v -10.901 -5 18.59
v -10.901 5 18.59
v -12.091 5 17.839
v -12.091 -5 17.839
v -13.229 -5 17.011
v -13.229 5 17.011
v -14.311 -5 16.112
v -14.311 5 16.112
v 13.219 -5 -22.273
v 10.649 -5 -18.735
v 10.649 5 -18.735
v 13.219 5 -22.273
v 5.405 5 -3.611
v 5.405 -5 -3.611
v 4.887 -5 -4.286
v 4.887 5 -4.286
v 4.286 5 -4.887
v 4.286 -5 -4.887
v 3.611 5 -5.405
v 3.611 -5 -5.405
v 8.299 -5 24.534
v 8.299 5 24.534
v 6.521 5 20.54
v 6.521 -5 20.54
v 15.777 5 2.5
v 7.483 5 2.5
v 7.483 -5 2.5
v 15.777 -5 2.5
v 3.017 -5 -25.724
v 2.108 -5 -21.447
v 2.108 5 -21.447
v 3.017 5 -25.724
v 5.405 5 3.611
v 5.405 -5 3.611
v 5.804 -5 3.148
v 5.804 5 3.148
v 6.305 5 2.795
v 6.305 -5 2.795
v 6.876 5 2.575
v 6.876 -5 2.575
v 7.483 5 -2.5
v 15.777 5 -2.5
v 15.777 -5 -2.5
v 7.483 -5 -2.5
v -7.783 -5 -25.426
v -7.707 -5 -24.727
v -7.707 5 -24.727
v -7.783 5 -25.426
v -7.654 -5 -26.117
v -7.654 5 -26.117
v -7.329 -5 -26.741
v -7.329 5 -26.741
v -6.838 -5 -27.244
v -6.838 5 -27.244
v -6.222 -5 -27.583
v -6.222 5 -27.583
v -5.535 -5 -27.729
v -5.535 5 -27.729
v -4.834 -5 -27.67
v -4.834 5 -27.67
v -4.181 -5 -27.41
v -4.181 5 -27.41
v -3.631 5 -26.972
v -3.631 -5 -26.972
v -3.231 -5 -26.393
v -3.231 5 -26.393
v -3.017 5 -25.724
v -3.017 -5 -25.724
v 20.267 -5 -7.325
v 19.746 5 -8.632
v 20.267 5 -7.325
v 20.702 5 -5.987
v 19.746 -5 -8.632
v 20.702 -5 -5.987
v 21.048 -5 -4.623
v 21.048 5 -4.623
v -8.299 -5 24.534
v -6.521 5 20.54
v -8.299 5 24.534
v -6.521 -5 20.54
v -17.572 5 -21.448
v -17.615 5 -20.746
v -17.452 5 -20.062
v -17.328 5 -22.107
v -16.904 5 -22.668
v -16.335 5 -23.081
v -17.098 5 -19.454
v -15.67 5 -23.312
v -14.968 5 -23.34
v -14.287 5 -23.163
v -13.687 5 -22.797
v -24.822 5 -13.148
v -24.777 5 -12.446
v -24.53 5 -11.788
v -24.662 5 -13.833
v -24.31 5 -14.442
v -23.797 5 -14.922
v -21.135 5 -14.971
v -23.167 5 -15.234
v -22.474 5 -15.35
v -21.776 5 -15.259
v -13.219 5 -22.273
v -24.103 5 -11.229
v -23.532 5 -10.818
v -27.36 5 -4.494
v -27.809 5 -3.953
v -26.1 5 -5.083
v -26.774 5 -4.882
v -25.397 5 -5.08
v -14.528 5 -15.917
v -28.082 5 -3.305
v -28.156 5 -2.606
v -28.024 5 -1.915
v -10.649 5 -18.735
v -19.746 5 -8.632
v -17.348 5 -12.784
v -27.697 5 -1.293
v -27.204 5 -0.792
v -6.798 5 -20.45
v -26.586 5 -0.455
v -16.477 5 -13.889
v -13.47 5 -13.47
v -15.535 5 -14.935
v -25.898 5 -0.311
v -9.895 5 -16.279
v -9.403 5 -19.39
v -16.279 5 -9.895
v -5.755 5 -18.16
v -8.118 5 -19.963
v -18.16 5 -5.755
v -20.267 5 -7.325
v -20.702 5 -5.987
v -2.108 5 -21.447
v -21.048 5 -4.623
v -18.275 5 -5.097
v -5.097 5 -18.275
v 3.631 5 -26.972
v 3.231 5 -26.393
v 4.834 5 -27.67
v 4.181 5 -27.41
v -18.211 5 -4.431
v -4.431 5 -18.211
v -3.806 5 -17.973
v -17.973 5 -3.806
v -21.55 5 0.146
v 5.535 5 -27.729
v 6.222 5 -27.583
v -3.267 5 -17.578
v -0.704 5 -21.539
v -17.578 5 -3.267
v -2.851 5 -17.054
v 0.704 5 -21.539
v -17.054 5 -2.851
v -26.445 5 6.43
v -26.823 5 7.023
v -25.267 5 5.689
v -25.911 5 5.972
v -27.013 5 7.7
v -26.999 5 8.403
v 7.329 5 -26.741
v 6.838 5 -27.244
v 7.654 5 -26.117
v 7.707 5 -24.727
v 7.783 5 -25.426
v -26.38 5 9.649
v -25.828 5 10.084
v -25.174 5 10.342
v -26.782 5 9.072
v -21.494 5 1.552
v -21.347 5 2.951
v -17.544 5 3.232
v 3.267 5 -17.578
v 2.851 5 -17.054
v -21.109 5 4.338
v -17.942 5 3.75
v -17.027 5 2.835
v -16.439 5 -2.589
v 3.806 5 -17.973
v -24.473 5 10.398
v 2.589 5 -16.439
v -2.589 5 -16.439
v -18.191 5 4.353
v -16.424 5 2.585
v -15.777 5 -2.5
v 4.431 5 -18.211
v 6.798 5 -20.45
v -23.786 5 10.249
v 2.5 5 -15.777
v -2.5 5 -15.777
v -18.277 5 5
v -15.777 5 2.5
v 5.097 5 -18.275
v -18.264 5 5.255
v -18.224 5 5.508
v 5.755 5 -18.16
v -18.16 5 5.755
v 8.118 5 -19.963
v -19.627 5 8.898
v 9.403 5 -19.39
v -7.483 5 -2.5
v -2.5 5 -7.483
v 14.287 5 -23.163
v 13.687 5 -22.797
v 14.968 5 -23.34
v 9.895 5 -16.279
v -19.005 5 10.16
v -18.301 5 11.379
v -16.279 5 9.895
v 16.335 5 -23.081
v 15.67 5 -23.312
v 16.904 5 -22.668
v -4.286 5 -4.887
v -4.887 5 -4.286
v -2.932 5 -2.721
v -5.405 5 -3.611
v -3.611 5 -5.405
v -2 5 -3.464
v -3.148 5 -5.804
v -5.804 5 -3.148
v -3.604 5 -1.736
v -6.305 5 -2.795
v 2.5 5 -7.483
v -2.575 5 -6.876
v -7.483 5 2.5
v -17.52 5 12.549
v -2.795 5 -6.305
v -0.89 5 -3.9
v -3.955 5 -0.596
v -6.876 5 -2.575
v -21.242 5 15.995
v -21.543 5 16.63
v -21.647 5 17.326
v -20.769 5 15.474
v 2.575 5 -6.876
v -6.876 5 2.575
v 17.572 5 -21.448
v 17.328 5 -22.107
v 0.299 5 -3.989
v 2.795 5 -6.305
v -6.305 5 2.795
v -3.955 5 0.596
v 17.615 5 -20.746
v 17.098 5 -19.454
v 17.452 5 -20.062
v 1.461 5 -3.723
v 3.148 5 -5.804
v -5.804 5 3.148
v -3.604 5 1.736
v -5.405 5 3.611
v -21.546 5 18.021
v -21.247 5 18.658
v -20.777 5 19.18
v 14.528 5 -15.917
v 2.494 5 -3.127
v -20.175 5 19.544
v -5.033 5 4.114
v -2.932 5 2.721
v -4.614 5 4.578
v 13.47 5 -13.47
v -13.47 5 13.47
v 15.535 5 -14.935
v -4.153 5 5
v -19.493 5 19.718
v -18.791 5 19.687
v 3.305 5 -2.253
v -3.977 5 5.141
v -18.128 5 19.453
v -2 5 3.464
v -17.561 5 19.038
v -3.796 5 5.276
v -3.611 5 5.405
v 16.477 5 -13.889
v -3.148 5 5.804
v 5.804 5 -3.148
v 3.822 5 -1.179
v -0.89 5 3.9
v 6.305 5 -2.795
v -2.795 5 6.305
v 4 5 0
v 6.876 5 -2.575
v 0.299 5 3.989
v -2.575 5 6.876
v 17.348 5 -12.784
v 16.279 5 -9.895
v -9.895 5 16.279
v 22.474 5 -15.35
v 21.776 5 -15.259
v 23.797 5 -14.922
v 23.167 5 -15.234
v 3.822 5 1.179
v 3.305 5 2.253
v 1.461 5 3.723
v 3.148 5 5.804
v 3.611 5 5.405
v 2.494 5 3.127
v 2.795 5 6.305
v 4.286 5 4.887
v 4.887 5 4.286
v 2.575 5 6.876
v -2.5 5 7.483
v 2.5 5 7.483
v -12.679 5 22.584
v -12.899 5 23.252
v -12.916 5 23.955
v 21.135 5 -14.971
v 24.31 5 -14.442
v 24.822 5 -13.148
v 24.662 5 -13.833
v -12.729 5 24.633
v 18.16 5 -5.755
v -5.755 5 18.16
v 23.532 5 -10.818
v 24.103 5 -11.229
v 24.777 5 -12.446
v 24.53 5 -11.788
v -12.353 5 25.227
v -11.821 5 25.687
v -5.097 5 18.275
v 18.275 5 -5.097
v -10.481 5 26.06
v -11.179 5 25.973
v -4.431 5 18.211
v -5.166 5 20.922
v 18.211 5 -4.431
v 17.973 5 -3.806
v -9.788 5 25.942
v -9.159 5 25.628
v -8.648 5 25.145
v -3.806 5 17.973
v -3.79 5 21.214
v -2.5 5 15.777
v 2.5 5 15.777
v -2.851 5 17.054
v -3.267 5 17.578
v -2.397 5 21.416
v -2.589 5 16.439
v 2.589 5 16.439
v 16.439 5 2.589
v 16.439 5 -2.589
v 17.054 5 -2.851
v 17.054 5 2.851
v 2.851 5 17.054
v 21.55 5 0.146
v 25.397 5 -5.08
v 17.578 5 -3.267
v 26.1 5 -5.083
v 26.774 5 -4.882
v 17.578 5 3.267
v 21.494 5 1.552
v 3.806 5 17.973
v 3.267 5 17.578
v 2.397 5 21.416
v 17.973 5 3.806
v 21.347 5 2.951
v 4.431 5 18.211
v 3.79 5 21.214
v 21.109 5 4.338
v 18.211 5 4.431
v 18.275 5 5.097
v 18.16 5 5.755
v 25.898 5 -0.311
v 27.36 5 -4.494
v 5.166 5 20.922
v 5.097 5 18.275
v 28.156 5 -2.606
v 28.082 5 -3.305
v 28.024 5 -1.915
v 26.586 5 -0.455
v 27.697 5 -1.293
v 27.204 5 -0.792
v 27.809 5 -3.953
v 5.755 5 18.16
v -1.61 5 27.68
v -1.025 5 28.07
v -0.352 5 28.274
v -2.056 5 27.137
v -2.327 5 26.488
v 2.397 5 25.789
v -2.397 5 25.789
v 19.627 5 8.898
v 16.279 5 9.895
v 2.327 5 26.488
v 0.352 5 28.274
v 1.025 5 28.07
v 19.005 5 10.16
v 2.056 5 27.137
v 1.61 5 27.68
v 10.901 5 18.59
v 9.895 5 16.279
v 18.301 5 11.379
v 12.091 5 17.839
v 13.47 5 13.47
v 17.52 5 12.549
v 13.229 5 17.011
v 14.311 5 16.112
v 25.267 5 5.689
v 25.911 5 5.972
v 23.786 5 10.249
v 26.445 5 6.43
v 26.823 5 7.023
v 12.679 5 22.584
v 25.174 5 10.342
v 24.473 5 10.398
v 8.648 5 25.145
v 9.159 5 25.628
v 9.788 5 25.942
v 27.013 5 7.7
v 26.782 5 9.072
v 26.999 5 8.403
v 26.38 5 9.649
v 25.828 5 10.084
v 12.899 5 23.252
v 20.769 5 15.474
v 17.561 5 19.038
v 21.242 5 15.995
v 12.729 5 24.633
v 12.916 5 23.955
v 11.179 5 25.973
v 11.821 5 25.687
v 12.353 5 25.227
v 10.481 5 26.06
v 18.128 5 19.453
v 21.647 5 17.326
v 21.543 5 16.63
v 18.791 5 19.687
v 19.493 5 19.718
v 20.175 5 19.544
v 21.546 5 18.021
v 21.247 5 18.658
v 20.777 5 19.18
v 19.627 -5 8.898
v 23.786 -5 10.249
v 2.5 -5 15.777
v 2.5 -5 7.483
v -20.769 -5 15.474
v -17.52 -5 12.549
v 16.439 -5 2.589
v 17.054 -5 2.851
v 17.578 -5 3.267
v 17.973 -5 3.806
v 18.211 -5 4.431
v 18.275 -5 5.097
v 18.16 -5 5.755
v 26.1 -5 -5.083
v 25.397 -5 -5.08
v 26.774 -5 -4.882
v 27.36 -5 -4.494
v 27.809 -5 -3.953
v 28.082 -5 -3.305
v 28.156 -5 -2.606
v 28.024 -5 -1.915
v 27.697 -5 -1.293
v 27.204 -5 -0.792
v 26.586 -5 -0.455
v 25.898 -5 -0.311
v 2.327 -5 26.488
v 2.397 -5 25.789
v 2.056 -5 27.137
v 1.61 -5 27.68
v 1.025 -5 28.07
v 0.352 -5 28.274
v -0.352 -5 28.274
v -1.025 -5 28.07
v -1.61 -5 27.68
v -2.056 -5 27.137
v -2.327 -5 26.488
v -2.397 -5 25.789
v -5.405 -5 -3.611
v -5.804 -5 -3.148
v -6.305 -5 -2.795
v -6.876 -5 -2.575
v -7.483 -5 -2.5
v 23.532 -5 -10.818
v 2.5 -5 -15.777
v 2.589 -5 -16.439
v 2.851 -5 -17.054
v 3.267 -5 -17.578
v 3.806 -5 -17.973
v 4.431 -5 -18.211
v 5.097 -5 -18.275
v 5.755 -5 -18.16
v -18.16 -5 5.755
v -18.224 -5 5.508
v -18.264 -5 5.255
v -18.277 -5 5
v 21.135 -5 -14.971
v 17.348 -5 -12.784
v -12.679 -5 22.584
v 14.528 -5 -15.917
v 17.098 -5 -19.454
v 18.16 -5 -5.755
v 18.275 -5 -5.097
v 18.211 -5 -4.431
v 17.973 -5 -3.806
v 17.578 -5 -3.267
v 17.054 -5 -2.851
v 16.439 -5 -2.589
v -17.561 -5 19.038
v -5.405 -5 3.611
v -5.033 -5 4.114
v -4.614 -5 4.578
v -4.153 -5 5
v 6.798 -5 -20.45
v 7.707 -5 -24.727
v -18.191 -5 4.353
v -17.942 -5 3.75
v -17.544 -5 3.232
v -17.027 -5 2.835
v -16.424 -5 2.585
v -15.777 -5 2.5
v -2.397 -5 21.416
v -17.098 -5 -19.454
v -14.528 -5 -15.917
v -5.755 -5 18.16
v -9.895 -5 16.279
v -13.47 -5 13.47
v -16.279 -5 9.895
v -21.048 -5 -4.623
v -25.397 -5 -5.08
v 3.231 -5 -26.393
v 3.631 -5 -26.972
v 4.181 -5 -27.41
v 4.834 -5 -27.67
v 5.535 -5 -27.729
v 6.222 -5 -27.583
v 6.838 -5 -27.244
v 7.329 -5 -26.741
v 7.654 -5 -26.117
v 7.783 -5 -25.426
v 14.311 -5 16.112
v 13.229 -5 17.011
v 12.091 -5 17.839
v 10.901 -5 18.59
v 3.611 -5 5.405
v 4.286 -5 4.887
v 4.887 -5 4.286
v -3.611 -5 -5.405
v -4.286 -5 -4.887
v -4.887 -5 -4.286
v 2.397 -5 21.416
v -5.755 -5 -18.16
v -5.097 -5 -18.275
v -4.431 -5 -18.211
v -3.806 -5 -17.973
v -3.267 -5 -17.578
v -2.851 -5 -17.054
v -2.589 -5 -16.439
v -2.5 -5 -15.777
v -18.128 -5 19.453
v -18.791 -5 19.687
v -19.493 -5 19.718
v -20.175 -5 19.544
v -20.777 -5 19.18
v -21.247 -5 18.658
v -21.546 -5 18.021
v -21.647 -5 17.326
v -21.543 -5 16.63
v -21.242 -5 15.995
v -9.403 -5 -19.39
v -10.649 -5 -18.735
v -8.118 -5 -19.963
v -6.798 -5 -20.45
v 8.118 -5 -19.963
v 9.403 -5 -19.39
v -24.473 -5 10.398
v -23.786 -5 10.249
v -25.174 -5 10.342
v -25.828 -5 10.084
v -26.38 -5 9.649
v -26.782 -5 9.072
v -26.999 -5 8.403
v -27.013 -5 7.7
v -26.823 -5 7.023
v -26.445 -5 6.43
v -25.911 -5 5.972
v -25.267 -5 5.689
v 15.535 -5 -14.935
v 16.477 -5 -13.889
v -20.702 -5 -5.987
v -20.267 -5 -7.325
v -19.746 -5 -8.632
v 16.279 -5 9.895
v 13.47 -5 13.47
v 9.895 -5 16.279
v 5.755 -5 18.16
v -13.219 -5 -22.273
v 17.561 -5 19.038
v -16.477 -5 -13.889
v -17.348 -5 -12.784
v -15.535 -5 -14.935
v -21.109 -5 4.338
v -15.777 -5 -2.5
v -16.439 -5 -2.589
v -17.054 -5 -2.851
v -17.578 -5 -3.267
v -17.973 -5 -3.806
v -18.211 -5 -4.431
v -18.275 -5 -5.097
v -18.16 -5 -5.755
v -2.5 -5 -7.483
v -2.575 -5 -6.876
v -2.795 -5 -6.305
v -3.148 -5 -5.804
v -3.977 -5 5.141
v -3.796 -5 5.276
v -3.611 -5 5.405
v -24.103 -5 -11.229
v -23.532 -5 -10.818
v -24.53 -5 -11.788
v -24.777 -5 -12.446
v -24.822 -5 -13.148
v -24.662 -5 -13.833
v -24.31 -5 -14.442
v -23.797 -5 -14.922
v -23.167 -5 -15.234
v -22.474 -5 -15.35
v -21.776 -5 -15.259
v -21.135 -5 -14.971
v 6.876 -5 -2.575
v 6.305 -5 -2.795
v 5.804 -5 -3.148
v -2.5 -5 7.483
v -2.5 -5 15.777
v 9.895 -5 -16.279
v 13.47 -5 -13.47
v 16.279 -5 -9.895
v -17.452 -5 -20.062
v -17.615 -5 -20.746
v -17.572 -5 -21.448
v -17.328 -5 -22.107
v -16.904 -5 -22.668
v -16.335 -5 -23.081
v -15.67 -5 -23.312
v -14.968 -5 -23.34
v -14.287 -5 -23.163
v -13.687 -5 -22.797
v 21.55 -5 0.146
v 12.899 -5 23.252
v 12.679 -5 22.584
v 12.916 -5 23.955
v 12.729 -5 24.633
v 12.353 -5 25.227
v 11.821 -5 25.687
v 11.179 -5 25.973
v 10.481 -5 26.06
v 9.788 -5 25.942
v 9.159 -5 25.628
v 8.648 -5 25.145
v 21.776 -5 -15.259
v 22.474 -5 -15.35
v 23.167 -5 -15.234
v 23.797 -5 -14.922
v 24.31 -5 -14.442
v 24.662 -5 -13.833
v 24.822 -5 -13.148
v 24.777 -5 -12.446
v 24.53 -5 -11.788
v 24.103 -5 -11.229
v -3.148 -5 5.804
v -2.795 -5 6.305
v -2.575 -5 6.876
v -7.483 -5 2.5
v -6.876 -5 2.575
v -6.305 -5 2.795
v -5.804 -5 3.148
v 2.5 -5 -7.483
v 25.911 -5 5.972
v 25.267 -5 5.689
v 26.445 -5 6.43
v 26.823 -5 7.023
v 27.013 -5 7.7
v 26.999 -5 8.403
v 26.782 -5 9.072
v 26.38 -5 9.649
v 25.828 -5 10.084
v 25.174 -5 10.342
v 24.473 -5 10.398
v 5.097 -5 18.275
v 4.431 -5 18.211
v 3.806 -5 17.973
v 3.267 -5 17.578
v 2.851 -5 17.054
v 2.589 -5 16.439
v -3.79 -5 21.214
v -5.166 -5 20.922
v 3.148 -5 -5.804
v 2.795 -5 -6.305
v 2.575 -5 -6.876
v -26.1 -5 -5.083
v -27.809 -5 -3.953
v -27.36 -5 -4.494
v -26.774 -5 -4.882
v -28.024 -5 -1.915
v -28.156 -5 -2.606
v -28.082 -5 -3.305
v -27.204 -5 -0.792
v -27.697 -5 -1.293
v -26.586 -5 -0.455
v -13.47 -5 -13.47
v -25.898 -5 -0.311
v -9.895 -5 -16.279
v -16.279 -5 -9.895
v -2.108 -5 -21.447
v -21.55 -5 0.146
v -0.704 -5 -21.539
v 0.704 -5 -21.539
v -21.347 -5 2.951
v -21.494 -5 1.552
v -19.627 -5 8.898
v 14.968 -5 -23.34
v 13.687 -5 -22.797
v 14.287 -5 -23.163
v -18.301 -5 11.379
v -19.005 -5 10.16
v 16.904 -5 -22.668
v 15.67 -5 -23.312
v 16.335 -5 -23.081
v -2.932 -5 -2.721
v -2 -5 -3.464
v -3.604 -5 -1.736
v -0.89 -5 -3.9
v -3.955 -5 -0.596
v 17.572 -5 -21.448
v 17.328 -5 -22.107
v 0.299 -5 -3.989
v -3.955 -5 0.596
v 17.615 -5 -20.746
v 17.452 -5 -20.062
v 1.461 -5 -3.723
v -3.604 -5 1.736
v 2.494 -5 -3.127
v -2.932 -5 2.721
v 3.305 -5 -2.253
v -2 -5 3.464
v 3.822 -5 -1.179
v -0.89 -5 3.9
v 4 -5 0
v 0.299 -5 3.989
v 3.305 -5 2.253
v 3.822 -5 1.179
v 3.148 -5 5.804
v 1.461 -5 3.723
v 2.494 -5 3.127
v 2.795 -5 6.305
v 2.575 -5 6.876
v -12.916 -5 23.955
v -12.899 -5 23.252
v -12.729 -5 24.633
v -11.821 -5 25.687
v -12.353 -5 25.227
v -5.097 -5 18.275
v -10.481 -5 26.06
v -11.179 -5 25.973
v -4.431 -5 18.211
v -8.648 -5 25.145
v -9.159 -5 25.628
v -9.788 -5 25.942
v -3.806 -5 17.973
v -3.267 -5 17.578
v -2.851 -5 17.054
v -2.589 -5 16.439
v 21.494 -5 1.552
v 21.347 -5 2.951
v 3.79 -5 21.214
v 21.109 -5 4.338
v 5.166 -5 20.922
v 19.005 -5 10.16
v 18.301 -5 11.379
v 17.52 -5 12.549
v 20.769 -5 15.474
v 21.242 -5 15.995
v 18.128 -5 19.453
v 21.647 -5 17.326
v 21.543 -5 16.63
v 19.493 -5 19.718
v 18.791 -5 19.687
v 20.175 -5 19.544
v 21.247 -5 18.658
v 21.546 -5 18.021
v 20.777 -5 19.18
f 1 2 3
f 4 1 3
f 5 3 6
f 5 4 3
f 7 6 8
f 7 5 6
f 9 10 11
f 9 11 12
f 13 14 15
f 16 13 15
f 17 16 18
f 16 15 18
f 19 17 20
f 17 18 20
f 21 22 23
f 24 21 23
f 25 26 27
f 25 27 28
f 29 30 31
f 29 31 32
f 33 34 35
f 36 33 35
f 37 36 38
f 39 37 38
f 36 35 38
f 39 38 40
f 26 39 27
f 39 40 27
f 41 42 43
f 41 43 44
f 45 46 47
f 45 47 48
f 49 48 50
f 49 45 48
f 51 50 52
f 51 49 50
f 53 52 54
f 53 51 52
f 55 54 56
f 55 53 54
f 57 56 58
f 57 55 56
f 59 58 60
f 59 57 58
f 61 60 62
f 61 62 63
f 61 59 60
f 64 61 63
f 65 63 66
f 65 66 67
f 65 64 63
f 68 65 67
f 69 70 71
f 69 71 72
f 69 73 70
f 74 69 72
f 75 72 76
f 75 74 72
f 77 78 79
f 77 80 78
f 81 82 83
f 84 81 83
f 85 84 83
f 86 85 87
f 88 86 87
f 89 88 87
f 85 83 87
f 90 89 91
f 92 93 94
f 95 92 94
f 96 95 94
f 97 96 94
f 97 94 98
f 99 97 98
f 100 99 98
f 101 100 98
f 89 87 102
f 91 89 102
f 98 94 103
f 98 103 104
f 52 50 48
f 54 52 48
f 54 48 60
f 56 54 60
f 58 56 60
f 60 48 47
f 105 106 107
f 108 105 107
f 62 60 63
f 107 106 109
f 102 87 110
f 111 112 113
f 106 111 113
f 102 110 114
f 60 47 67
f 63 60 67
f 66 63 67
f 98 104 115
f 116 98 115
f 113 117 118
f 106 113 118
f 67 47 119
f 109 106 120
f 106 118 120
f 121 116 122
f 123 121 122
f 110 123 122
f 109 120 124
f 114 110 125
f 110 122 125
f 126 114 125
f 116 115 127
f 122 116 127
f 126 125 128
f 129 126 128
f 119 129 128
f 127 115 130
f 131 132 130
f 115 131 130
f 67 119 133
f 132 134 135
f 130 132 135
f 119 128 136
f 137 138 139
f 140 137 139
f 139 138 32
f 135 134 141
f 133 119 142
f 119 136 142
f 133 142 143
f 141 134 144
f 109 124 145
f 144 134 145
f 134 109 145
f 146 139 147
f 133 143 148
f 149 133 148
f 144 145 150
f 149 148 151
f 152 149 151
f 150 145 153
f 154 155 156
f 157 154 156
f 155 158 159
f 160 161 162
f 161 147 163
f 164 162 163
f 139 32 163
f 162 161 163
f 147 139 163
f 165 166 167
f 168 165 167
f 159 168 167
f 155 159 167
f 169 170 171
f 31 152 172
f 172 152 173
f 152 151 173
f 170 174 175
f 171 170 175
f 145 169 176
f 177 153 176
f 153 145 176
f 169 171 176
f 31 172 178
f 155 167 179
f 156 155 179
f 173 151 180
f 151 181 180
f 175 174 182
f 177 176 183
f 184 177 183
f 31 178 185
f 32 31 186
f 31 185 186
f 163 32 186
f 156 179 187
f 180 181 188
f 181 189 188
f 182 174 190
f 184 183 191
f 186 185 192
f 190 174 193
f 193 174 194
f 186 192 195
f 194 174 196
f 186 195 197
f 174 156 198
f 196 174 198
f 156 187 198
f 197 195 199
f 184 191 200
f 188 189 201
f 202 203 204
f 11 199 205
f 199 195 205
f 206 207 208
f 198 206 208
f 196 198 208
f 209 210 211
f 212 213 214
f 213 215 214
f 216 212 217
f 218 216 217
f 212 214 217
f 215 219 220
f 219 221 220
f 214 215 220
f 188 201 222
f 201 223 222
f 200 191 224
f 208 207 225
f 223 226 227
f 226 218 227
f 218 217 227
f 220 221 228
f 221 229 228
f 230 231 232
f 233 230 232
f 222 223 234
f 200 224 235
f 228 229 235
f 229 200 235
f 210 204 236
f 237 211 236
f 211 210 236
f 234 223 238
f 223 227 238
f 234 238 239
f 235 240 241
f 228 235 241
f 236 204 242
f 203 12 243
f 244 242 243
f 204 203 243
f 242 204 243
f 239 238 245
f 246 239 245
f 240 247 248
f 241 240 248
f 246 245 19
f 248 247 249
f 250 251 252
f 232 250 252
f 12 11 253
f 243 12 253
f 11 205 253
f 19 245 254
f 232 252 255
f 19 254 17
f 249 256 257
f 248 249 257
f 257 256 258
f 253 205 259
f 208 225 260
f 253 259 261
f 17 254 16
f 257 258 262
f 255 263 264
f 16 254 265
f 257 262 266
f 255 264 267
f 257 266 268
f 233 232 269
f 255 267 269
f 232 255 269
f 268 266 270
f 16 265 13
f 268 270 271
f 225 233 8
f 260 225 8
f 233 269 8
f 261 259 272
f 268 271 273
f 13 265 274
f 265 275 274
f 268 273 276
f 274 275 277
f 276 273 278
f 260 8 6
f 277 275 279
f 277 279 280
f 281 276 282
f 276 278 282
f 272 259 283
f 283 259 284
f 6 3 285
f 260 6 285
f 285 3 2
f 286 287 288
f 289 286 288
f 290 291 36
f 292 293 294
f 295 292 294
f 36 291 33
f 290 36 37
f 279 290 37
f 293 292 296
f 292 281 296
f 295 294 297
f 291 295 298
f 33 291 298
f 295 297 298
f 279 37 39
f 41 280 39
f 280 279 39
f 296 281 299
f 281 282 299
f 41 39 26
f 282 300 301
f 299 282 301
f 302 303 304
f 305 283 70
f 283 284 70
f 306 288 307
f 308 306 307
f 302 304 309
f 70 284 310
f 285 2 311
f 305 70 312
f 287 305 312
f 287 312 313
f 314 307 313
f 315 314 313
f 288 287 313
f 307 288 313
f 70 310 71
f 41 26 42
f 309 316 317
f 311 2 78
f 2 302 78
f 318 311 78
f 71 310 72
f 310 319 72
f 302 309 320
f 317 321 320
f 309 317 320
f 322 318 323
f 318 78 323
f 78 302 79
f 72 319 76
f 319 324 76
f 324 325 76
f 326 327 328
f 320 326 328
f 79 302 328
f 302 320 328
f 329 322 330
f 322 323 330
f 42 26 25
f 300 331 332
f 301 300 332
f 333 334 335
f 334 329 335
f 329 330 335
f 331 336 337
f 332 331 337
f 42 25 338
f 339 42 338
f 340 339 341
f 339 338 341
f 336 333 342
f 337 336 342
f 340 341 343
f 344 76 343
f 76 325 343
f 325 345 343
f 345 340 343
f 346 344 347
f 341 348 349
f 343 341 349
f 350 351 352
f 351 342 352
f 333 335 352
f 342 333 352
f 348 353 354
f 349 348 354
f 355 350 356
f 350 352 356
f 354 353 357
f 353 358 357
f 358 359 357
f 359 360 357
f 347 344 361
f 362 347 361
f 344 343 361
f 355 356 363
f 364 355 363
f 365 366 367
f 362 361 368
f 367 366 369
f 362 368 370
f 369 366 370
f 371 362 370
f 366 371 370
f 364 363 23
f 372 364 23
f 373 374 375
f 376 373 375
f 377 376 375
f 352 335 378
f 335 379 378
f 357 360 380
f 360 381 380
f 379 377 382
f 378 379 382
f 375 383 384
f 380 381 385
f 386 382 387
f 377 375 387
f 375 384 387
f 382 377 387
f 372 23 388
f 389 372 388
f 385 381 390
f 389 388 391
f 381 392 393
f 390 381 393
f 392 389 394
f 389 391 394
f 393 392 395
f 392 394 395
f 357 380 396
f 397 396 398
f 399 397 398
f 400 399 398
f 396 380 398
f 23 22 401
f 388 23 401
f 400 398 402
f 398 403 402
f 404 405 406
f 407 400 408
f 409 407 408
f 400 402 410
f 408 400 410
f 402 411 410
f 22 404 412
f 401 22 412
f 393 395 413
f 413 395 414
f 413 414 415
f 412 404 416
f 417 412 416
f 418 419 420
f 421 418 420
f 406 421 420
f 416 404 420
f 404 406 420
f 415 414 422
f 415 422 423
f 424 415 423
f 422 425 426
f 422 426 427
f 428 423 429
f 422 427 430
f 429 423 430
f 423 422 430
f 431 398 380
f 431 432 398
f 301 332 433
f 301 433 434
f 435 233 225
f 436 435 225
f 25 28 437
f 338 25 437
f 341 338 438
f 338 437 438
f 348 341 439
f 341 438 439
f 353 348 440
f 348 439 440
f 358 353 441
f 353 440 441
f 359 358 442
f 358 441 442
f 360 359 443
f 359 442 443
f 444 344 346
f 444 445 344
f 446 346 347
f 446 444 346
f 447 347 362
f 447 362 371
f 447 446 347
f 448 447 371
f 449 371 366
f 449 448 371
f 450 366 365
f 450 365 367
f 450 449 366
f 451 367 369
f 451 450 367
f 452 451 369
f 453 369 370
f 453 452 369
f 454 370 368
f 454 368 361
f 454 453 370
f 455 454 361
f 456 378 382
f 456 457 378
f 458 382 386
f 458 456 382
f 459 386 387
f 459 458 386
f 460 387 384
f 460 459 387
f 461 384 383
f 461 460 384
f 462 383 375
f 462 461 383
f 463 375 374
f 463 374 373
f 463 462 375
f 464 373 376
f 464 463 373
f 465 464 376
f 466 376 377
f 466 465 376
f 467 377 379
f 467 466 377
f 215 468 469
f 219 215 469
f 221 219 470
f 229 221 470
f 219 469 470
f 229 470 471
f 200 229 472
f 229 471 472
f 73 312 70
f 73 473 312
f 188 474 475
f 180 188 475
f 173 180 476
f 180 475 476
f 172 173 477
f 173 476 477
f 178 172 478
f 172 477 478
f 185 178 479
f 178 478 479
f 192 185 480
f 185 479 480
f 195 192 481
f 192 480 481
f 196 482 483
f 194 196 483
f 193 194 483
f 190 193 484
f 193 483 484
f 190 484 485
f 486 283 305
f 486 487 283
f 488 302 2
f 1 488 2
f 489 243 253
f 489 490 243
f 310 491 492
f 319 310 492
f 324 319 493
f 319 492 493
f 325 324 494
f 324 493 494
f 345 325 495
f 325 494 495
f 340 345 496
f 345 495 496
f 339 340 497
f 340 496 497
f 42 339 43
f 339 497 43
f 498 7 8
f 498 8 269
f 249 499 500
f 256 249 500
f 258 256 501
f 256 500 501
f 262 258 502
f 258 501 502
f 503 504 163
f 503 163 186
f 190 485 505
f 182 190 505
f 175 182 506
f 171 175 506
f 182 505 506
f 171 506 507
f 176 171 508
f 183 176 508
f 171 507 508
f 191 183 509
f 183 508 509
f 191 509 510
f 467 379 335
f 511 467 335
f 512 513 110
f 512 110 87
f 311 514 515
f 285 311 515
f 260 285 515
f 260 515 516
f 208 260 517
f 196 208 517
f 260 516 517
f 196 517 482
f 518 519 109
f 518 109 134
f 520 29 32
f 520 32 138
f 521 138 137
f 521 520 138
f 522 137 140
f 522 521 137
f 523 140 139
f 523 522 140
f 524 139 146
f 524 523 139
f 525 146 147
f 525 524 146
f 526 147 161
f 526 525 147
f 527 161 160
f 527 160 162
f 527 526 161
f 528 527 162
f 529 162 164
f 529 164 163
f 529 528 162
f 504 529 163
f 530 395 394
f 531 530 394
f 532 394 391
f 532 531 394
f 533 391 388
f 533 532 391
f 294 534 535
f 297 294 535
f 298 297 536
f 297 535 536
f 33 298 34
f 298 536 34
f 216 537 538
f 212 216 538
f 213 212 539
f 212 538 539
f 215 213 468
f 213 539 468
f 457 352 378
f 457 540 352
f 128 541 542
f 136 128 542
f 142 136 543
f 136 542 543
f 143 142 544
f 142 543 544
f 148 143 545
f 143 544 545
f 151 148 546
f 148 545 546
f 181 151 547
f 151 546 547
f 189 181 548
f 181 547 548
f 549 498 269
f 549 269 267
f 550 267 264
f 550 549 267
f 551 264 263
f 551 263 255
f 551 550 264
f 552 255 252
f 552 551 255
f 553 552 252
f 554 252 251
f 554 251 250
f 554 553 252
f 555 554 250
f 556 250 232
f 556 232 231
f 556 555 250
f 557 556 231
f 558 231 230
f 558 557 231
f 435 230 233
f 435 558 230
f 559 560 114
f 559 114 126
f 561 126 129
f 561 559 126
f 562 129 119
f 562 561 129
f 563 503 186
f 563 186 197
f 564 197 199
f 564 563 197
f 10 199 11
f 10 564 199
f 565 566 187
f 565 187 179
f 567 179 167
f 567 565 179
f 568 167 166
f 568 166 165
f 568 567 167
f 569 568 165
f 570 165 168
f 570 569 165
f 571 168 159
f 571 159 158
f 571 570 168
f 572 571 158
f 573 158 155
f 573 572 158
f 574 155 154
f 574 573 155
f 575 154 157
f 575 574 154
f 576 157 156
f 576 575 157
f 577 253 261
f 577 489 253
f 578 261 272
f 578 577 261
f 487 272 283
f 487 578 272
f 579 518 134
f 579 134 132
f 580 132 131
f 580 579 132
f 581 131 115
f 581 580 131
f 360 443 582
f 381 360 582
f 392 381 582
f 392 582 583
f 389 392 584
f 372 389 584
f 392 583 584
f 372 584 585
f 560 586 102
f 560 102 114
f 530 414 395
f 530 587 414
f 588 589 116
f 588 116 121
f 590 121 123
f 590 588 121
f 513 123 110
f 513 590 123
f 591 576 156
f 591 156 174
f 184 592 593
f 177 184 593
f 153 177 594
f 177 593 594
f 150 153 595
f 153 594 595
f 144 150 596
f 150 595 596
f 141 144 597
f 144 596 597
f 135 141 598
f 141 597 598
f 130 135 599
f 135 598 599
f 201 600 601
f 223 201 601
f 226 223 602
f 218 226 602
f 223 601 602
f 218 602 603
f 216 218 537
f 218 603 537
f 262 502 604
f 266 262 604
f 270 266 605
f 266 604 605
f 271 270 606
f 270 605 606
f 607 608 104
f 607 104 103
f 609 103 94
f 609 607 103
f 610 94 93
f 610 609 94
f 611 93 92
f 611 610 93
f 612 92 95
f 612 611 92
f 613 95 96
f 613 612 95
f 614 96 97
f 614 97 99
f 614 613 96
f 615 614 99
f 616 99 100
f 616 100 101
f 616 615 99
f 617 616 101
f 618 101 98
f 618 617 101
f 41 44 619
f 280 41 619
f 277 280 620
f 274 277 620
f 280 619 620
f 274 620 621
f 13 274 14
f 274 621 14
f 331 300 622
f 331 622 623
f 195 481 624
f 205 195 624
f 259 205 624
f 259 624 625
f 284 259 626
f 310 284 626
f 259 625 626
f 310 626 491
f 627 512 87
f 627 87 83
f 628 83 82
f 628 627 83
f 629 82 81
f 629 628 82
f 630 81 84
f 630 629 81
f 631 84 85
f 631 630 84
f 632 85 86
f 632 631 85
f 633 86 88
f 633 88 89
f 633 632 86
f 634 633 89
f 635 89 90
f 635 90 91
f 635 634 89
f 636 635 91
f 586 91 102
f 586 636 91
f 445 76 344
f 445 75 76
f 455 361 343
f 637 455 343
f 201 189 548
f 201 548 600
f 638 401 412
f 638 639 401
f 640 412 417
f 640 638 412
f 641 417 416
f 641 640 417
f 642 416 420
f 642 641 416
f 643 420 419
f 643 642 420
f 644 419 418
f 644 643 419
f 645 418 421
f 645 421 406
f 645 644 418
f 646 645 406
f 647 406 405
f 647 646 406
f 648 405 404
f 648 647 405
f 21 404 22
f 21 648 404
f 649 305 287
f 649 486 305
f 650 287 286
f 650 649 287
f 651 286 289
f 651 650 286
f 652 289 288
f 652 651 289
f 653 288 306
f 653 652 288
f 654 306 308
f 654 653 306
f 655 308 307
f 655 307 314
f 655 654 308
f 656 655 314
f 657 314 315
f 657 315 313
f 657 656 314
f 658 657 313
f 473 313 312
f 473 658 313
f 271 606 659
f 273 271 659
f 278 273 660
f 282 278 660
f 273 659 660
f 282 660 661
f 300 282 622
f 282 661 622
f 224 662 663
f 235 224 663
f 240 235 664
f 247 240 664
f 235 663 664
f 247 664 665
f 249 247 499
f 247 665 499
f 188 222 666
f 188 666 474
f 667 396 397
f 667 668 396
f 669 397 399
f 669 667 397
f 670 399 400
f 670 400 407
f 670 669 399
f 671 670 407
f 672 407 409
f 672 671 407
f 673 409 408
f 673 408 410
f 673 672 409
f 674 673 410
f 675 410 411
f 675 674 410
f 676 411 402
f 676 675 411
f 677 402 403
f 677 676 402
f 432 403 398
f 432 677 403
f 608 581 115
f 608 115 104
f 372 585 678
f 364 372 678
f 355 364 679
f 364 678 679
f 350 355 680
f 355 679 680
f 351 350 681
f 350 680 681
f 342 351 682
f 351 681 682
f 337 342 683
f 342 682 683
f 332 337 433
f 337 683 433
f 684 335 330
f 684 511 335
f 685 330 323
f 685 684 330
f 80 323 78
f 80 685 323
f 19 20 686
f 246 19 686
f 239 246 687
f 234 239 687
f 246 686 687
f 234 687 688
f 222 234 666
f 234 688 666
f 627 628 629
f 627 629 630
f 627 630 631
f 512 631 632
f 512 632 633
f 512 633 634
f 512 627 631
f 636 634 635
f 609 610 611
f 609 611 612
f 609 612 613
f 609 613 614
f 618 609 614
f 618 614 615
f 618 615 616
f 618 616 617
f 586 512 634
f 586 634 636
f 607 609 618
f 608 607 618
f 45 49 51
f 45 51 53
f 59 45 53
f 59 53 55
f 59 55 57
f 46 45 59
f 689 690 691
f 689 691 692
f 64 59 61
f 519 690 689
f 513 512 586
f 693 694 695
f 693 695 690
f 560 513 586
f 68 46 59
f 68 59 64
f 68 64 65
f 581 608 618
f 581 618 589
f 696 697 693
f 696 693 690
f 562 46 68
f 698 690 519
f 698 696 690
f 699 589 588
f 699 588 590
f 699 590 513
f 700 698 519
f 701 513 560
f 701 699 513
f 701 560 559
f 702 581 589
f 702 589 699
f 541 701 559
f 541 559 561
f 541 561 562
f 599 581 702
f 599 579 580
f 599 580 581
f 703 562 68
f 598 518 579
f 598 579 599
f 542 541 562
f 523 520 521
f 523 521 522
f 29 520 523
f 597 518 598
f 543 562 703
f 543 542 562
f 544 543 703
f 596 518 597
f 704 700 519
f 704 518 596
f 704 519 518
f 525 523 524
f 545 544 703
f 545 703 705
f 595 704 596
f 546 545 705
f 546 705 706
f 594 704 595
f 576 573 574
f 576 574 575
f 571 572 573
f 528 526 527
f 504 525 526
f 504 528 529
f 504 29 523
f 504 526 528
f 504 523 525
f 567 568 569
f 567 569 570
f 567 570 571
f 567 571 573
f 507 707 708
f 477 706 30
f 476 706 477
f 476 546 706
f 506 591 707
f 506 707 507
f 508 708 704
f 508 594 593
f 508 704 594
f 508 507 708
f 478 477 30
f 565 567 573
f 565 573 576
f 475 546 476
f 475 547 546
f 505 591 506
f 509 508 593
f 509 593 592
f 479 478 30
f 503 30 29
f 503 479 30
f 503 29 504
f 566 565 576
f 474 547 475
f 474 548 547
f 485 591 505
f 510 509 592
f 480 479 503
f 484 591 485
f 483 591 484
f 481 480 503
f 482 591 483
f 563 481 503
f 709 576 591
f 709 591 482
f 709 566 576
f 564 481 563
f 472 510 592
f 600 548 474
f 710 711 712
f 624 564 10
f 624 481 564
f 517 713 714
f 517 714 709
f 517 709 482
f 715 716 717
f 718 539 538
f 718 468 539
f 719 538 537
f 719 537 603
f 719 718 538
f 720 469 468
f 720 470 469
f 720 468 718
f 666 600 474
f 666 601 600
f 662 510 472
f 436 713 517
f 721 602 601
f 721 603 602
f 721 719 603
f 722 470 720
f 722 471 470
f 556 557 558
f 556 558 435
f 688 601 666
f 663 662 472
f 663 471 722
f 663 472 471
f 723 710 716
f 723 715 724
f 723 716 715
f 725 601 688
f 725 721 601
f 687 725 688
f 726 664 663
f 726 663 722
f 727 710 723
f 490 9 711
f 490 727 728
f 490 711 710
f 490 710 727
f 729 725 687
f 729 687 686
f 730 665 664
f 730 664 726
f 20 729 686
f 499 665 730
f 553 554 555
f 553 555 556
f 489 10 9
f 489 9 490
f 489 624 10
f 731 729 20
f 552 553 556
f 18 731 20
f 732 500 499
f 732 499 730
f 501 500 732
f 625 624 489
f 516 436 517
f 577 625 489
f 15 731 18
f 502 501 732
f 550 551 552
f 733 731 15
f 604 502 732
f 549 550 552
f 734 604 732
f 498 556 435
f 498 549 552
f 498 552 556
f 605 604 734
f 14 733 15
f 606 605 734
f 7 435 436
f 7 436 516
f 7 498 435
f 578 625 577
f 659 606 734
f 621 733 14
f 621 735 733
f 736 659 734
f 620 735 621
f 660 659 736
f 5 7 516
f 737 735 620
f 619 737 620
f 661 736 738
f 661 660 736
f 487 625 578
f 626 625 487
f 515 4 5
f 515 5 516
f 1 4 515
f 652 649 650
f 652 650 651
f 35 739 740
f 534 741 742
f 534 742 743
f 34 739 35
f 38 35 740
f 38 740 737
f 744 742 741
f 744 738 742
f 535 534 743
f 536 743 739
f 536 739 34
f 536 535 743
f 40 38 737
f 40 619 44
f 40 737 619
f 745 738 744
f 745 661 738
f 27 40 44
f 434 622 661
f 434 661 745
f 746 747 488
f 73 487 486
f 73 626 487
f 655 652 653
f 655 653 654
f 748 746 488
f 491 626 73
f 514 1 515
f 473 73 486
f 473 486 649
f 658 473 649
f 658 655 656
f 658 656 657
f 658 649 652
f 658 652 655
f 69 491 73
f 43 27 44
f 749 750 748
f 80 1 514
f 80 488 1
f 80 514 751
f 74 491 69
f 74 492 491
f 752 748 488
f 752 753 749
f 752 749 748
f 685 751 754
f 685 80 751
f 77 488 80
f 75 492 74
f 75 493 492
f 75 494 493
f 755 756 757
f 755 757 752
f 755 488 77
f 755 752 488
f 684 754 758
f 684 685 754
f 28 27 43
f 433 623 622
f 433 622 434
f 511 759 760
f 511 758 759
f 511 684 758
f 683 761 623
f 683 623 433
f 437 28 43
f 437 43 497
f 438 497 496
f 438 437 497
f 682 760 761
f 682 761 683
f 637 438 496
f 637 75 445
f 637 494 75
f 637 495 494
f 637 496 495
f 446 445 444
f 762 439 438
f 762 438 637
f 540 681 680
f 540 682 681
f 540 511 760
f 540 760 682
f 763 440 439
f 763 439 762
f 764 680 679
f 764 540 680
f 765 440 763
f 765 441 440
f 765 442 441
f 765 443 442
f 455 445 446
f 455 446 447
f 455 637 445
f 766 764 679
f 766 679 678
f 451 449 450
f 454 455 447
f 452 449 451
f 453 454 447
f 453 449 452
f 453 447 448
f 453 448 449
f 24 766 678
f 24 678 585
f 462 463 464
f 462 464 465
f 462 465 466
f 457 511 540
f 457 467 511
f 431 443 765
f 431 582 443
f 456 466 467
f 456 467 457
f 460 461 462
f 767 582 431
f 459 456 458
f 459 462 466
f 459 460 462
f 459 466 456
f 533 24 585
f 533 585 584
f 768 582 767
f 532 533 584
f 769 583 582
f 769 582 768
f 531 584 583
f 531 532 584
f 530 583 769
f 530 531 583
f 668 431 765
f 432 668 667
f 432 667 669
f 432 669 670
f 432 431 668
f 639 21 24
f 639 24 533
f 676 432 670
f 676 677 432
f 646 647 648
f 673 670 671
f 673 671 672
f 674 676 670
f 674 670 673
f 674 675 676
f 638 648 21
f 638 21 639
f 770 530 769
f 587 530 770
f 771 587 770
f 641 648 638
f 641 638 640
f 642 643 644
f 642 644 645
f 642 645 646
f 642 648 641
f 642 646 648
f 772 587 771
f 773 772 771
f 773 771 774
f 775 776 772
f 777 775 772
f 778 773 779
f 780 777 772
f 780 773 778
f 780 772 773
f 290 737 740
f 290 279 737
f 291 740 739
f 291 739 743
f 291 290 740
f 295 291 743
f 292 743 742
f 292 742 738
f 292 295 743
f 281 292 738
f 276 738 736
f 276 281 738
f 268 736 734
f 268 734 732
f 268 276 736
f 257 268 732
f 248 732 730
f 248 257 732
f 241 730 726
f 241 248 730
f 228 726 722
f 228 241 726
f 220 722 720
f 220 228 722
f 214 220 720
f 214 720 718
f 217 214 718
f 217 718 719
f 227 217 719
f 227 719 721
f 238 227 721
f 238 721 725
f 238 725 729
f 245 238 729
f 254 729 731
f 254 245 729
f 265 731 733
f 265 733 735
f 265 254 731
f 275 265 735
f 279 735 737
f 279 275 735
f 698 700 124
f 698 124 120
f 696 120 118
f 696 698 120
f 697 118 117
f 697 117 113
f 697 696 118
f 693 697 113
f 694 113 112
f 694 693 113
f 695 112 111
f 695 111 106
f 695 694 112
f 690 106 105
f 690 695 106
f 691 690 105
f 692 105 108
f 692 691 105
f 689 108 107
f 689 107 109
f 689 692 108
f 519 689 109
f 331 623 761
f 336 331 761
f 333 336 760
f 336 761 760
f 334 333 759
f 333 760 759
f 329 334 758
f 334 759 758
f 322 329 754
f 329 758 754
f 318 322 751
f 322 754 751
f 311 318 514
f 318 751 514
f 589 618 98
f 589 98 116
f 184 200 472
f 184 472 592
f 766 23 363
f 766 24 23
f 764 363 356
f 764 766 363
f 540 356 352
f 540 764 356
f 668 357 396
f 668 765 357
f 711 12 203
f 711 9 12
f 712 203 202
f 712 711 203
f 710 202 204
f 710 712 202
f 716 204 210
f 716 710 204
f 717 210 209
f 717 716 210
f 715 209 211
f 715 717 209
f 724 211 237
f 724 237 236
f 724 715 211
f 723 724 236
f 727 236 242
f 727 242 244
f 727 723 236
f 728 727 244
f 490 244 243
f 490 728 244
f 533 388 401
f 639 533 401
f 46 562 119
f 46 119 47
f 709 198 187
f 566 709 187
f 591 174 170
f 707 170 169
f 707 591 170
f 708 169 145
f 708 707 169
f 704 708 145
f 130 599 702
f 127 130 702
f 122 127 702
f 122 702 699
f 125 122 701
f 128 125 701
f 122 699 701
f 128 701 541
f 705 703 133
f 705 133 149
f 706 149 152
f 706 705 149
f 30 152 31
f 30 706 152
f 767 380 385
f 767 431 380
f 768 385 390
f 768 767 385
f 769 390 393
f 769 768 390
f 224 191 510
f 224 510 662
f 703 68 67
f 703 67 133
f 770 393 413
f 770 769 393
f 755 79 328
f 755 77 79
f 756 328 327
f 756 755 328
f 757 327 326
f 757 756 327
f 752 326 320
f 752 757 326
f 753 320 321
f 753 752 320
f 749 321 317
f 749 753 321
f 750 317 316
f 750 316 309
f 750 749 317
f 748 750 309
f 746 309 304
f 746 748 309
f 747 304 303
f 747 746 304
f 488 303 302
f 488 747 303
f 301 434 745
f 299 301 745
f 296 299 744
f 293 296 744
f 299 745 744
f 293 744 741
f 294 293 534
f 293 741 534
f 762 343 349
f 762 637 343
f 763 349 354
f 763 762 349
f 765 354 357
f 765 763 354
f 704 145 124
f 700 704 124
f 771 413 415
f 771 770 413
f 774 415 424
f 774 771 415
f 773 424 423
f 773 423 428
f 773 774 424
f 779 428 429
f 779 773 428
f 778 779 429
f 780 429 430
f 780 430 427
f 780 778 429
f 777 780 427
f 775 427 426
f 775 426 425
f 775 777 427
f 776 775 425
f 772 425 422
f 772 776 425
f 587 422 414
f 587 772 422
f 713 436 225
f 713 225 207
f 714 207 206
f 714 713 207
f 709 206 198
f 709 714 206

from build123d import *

# Parameters (mm, degrees)
F0_R     = 4
F1_DEPTH = 5
F3_DEPTH = 10


with BuildPart() as f1:
    # F0 (on Front) → F1 (new body, symmetric)
    with BuildSketch(Plane.XZ):
        with BuildLine():
            Line((-12.679406, 22.584124), (-10.90092, 18.589579))
            ThreePointArc((-10.90092, 18.589579), (-12.666772, 17.434316), (-14.311171, 16.111887))
            Line((-14.311171, 16.111887), (-17.560627, 19.03771))
            ThreePointArc((-17.560627, 19.03771), (-21.030999, 18.936396), (-20.769004, 15.474445))
            Line((-20.769004, 15.474445), (-17.519549, 12.548622))
            ThreePointArc((-17.519549, 12.548622), (-18.662847, 10.775), (-19.6272, 8.898063))
            Line((-19.6272, 8.898063), (-23.785765, 10.249263))
            ThreePointArc((-23.785765, 10.249263), (-26.914899, 8.745181), (-25.267454, 5.689094))
            Line((-25.267454, 5.689094), (-21.108888, 4.337894))
            ThreePointArc((-21.108888, 4.337894), (-21.431947, 2.252588), (-21.549508, 0.145684))
            Line((-21.549508, 0.145684), (-25.898128, -0.311375))
            ThreePointArc((-25.898128, -0.311375), (-28.14497, -2.958156), (-25.39693, -5.079953))
            Line((-25.39693, -5.079953), (-21.04831, -4.622895))
            ThreePointArc((-21.04831, -4.622895), (-20.495268, -6.659316), (-19.74571, -8.631886))
            Line((-19.74571, -8.631886), (-23.53247, -10.818173))
            ThreePointArc((-23.53247, -10.818173), (-24.508519, -14.15), (-21.135047, -14.97063))
            Line((-21.135047, -14.97063), (-17.348287, -12.784343))
            ThreePointArc((-17.348287, -12.784343), (-16.014771, -14.419765), (-14.527699, -15.916924))
            Line((-14.527699, -15.916924), (-17.097834, -19.45441))
            ThreePointArc((-17.097834, -19.45441), (-16.634323, -22.895181), (-13.218722, -22.27275))
            Line((-13.218722, -22.27275), (-10.648588, -18.735263))
            ThreePointArc((-10.648588, -18.735263), (-8.765175, -19.686905), (-6.797718, -20.449781))
            Line((-6.797718, -20.449781), (-7.706827, -24.726804))
            ThreePointArc((-7.706827, -24.726804), (-5.883901, -27.681577), (-3.01676, -25.723708))
            Line((-3.01676, -25.723708), (-2.107651, -21.446685))
            ThreePointArc((-2.107651, -21.446685), (0, -21.55), (2.107651, -21.446685))
            Line((2.107651, -21.446685), (3.01676, -25.723708))
            ThreePointArc((3.01676, -25.723708), (5.883901, -27.681577), (7.706827, -24.726804))
            Line((7.706827, -24.726804), (6.797718, -20.449781))
            ThreePointArc((6.797718, -20.449781), (8.765175, -19.686905), (10.648588, -18.735263))
            Line((10.648588, -18.735263), (13.218722, -22.27275))
            ThreePointArc((13.218722, -22.27275), (16.634323, -22.895181), (17.097834, -19.45441))
            Line((17.097834, -19.45441), (14.527699, -15.916924))
            ThreePointArc((14.527699, -15.916924), (16.014771, -14.419765), (17.348287, -12.784343))
            Line((17.348287, -12.784343), (21.135047, -14.97063))
            ThreePointArc((21.135047, -14.97063), (24.508519, -14.15), (23.53247, -10.818173))
            Line((23.53247, -10.818173), (19.74571, -8.631886))
            ThreePointArc((19.74571, -8.631886), (20.495268, -6.659316), (21.04831, -4.622895))
            Line((21.04831, -4.622895), (25.39693, -5.079953))
            ThreePointArc((25.39693, -5.079953), (28.14497, -2.958156), (25.898128, -0.311375))
            Line((25.898128, -0.311375), (21.549508, 0.145684))
            ThreePointArc((21.549508, 0.145684), (21.431947, 2.252588), (21.108888, 4.337894))
            Line((21.108888, 4.337894), (25.267454, 5.689094))
            ThreePointArc((25.267454, 5.689094), (26.914899, 8.745181), (23.785765, 10.249263))
            Line((23.785765, 10.249263), (19.6272, 8.898063))
            ThreePointArc((19.6272, 8.898063), (18.662847, 10.775), (17.519549, 12.548622))
            Line((17.519549, 12.548622), (20.769004, 15.474445))
            ThreePointArc((20.769004, 15.474445), (21.030999, 18.936396), (17.560627, 19.03771))
            Line((17.560627, 19.03771), (14.311171, 16.111887))
            ThreePointArc((14.311171, 16.111887), (12.666772, 17.434316), (10.90092, 18.589579))
            Line((10.90092, 18.589579), (12.679406, 22.584124))
            ThreePointArc((12.679406, 22.584124), (11.510647, 25.853336), (8.299097, 24.534364))
            Line((8.299097, 24.534364), (6.520611, 20.539818))
            ThreePointArc((6.520611, 20.539818), (4.480497, 21.079081), (2.397423, 21.416229))
            Line((2.397423, 21.416229), (2.397423, 25.788803))
            ThreePointArc((2.397423, 25.788803), (0, 28.3), (-2.397423, 25.788803))
            Line((-2.397423, 25.788803), (-2.397423, 21.416229))
            ThreePointArc((-2.397423, 21.416229), (-4.480497, 21.079081), (-6.520611, 20.539818))
            Line((-6.520611, 20.539818), (-8.299097, 24.534364))
            ThreePointArc((-8.299097, 24.534364), (-11.510647, 25.853336), (-12.679406, 22.584124))
        make_face()
        Circle(F0_R, mode=Mode.SUBTRACT)
    extrude(amount=F1_DEPTH, both=True)

    # F2 (on face) → F3 (cut)
    with BuildSketch(Plane.XZ.offset(5)):
        with BuildLine():
            ThreePointArc((-5.755287, 18.159823), (-13.470384, 13.470384), (-18.159823, 5.755287))
            ThreePointArc((-18.159823, 5.755287), (-18.247266, 5.382134), (-18.276644, 5))
            Line((-18.276644, 5), (-4.153312, 5))
            ThreePointArc((-4.153312, 5), (-3.887479, 5.209367), (-3.611111, 5.404616))
            ThreePointArc((-3.611111, 5.404616), (-2.795207, 6.304803), (-2.5, 7.483315))
            Line((-2.5, 7.483315), (-2.5, 15.776644))
            ThreePointArc((-2.5, 15.776644), (-3.523216, 17.793847), (-5.755287, 18.159823))
        make_face()
        with BuildLine():
            Line((-4.153312, 5), (-18.276644, 5))
            ThreePointArc((-18.276644, 5), (-17.544411, 3.232233), (-15.776644, 2.5))
            Line((-15.776644, 2.5), (-7.483315, 2.5))
            ThreePointArc((-7.483315, 2.5), (-6.304803, 2.795207), (-5.404616, 3.611111))
            ThreePointArc((-5.404616, 3.611111), (-4.829156, 4.350776), (-4.153312, 5))
        make_face()
        with BuildLine():
            ThreePointArc((5.755287, 18.159823), (3.523216, 17.793847), (2.5, 15.776644))
            Line((2.5, 15.776644), (2.5, 7.483315))
            ThreePointArc((2.5, 7.483315), (2.795207, 6.304803), (3.611111, 5.404616))
            ThreePointArc((3.611111, 5.404616), (4.596194, 4.596194), (5.404616, 3.611111))
            ThreePointArc((5.404616, 3.611111), (6.304803, 2.795207), (7.483315, 2.5))
            Line((7.483315, 2.5), (15.776644, 2.5))
            ThreePointArc((15.776644, 2.5), (17.793847, 3.523216), (18.159823, 5.755287))
            ThreePointArc((18.159823, 5.755287), (13.470384, 13.470384), (5.755287, 18.159823))
        make_face()
        with BuildLine():
            Line((-7.483315, -2.5), (-15.776644, -2.5))
            ThreePointArc((-15.776644, -2.5), (-17.793847, -3.523216), (-18.159823, -5.755287))
            ThreePointArc((-18.159823, -5.755287), (-13.470384, -13.470384), (-5.755287, -18.159823))
            ThreePointArc((-5.755287, -18.159823), (-3.523216, -17.793847), (-2.5, -15.776644))
            Line((-2.5, -15.776644), (-2.5, -7.483315))
            ThreePointArc((-2.5, -7.483315), (-2.795207, -6.304803), (-3.611111, -5.404616))
            ThreePointArc((-3.611111, -5.404616), (-4.596194, -4.596194), (-5.404616, -3.611111))
            ThreePointArc((-5.404616, -3.611111), (-6.304803, -2.795207), (-7.483315, -2.5))
        make_face()
        with BuildLine():
            ThreePointArc((5.404616, -3.611111), (4.596194, -4.596194), (3.611111, -5.404616))
            ThreePointArc((3.611111, -5.404616), (2.795207, -6.304803), (2.5, -7.483315))
            Line((2.5, -7.483315), (2.5, -15.776644))
            ThreePointArc((2.5, -15.776644), (3.523216, -17.793847), (5.755287, -18.159823))
            ThreePointArc((5.755287, -18.159823), (13.470384, -13.470384), (18.159823, -5.755287))
            ThreePointArc((18.159823, -5.755287), (17.793847, -3.523216), (15.776644, -2.5))
            Line((15.776644, -2.5), (7.483315, -2.5))
            ThreePointArc((7.483315, -2.5), (6.304803, -2.795207), (5.404616, -3.611111))
        make_face()
    extrude(amount=-F3_DEPTH, mode=Mode.SUBTRACT)


solid = f1.part
